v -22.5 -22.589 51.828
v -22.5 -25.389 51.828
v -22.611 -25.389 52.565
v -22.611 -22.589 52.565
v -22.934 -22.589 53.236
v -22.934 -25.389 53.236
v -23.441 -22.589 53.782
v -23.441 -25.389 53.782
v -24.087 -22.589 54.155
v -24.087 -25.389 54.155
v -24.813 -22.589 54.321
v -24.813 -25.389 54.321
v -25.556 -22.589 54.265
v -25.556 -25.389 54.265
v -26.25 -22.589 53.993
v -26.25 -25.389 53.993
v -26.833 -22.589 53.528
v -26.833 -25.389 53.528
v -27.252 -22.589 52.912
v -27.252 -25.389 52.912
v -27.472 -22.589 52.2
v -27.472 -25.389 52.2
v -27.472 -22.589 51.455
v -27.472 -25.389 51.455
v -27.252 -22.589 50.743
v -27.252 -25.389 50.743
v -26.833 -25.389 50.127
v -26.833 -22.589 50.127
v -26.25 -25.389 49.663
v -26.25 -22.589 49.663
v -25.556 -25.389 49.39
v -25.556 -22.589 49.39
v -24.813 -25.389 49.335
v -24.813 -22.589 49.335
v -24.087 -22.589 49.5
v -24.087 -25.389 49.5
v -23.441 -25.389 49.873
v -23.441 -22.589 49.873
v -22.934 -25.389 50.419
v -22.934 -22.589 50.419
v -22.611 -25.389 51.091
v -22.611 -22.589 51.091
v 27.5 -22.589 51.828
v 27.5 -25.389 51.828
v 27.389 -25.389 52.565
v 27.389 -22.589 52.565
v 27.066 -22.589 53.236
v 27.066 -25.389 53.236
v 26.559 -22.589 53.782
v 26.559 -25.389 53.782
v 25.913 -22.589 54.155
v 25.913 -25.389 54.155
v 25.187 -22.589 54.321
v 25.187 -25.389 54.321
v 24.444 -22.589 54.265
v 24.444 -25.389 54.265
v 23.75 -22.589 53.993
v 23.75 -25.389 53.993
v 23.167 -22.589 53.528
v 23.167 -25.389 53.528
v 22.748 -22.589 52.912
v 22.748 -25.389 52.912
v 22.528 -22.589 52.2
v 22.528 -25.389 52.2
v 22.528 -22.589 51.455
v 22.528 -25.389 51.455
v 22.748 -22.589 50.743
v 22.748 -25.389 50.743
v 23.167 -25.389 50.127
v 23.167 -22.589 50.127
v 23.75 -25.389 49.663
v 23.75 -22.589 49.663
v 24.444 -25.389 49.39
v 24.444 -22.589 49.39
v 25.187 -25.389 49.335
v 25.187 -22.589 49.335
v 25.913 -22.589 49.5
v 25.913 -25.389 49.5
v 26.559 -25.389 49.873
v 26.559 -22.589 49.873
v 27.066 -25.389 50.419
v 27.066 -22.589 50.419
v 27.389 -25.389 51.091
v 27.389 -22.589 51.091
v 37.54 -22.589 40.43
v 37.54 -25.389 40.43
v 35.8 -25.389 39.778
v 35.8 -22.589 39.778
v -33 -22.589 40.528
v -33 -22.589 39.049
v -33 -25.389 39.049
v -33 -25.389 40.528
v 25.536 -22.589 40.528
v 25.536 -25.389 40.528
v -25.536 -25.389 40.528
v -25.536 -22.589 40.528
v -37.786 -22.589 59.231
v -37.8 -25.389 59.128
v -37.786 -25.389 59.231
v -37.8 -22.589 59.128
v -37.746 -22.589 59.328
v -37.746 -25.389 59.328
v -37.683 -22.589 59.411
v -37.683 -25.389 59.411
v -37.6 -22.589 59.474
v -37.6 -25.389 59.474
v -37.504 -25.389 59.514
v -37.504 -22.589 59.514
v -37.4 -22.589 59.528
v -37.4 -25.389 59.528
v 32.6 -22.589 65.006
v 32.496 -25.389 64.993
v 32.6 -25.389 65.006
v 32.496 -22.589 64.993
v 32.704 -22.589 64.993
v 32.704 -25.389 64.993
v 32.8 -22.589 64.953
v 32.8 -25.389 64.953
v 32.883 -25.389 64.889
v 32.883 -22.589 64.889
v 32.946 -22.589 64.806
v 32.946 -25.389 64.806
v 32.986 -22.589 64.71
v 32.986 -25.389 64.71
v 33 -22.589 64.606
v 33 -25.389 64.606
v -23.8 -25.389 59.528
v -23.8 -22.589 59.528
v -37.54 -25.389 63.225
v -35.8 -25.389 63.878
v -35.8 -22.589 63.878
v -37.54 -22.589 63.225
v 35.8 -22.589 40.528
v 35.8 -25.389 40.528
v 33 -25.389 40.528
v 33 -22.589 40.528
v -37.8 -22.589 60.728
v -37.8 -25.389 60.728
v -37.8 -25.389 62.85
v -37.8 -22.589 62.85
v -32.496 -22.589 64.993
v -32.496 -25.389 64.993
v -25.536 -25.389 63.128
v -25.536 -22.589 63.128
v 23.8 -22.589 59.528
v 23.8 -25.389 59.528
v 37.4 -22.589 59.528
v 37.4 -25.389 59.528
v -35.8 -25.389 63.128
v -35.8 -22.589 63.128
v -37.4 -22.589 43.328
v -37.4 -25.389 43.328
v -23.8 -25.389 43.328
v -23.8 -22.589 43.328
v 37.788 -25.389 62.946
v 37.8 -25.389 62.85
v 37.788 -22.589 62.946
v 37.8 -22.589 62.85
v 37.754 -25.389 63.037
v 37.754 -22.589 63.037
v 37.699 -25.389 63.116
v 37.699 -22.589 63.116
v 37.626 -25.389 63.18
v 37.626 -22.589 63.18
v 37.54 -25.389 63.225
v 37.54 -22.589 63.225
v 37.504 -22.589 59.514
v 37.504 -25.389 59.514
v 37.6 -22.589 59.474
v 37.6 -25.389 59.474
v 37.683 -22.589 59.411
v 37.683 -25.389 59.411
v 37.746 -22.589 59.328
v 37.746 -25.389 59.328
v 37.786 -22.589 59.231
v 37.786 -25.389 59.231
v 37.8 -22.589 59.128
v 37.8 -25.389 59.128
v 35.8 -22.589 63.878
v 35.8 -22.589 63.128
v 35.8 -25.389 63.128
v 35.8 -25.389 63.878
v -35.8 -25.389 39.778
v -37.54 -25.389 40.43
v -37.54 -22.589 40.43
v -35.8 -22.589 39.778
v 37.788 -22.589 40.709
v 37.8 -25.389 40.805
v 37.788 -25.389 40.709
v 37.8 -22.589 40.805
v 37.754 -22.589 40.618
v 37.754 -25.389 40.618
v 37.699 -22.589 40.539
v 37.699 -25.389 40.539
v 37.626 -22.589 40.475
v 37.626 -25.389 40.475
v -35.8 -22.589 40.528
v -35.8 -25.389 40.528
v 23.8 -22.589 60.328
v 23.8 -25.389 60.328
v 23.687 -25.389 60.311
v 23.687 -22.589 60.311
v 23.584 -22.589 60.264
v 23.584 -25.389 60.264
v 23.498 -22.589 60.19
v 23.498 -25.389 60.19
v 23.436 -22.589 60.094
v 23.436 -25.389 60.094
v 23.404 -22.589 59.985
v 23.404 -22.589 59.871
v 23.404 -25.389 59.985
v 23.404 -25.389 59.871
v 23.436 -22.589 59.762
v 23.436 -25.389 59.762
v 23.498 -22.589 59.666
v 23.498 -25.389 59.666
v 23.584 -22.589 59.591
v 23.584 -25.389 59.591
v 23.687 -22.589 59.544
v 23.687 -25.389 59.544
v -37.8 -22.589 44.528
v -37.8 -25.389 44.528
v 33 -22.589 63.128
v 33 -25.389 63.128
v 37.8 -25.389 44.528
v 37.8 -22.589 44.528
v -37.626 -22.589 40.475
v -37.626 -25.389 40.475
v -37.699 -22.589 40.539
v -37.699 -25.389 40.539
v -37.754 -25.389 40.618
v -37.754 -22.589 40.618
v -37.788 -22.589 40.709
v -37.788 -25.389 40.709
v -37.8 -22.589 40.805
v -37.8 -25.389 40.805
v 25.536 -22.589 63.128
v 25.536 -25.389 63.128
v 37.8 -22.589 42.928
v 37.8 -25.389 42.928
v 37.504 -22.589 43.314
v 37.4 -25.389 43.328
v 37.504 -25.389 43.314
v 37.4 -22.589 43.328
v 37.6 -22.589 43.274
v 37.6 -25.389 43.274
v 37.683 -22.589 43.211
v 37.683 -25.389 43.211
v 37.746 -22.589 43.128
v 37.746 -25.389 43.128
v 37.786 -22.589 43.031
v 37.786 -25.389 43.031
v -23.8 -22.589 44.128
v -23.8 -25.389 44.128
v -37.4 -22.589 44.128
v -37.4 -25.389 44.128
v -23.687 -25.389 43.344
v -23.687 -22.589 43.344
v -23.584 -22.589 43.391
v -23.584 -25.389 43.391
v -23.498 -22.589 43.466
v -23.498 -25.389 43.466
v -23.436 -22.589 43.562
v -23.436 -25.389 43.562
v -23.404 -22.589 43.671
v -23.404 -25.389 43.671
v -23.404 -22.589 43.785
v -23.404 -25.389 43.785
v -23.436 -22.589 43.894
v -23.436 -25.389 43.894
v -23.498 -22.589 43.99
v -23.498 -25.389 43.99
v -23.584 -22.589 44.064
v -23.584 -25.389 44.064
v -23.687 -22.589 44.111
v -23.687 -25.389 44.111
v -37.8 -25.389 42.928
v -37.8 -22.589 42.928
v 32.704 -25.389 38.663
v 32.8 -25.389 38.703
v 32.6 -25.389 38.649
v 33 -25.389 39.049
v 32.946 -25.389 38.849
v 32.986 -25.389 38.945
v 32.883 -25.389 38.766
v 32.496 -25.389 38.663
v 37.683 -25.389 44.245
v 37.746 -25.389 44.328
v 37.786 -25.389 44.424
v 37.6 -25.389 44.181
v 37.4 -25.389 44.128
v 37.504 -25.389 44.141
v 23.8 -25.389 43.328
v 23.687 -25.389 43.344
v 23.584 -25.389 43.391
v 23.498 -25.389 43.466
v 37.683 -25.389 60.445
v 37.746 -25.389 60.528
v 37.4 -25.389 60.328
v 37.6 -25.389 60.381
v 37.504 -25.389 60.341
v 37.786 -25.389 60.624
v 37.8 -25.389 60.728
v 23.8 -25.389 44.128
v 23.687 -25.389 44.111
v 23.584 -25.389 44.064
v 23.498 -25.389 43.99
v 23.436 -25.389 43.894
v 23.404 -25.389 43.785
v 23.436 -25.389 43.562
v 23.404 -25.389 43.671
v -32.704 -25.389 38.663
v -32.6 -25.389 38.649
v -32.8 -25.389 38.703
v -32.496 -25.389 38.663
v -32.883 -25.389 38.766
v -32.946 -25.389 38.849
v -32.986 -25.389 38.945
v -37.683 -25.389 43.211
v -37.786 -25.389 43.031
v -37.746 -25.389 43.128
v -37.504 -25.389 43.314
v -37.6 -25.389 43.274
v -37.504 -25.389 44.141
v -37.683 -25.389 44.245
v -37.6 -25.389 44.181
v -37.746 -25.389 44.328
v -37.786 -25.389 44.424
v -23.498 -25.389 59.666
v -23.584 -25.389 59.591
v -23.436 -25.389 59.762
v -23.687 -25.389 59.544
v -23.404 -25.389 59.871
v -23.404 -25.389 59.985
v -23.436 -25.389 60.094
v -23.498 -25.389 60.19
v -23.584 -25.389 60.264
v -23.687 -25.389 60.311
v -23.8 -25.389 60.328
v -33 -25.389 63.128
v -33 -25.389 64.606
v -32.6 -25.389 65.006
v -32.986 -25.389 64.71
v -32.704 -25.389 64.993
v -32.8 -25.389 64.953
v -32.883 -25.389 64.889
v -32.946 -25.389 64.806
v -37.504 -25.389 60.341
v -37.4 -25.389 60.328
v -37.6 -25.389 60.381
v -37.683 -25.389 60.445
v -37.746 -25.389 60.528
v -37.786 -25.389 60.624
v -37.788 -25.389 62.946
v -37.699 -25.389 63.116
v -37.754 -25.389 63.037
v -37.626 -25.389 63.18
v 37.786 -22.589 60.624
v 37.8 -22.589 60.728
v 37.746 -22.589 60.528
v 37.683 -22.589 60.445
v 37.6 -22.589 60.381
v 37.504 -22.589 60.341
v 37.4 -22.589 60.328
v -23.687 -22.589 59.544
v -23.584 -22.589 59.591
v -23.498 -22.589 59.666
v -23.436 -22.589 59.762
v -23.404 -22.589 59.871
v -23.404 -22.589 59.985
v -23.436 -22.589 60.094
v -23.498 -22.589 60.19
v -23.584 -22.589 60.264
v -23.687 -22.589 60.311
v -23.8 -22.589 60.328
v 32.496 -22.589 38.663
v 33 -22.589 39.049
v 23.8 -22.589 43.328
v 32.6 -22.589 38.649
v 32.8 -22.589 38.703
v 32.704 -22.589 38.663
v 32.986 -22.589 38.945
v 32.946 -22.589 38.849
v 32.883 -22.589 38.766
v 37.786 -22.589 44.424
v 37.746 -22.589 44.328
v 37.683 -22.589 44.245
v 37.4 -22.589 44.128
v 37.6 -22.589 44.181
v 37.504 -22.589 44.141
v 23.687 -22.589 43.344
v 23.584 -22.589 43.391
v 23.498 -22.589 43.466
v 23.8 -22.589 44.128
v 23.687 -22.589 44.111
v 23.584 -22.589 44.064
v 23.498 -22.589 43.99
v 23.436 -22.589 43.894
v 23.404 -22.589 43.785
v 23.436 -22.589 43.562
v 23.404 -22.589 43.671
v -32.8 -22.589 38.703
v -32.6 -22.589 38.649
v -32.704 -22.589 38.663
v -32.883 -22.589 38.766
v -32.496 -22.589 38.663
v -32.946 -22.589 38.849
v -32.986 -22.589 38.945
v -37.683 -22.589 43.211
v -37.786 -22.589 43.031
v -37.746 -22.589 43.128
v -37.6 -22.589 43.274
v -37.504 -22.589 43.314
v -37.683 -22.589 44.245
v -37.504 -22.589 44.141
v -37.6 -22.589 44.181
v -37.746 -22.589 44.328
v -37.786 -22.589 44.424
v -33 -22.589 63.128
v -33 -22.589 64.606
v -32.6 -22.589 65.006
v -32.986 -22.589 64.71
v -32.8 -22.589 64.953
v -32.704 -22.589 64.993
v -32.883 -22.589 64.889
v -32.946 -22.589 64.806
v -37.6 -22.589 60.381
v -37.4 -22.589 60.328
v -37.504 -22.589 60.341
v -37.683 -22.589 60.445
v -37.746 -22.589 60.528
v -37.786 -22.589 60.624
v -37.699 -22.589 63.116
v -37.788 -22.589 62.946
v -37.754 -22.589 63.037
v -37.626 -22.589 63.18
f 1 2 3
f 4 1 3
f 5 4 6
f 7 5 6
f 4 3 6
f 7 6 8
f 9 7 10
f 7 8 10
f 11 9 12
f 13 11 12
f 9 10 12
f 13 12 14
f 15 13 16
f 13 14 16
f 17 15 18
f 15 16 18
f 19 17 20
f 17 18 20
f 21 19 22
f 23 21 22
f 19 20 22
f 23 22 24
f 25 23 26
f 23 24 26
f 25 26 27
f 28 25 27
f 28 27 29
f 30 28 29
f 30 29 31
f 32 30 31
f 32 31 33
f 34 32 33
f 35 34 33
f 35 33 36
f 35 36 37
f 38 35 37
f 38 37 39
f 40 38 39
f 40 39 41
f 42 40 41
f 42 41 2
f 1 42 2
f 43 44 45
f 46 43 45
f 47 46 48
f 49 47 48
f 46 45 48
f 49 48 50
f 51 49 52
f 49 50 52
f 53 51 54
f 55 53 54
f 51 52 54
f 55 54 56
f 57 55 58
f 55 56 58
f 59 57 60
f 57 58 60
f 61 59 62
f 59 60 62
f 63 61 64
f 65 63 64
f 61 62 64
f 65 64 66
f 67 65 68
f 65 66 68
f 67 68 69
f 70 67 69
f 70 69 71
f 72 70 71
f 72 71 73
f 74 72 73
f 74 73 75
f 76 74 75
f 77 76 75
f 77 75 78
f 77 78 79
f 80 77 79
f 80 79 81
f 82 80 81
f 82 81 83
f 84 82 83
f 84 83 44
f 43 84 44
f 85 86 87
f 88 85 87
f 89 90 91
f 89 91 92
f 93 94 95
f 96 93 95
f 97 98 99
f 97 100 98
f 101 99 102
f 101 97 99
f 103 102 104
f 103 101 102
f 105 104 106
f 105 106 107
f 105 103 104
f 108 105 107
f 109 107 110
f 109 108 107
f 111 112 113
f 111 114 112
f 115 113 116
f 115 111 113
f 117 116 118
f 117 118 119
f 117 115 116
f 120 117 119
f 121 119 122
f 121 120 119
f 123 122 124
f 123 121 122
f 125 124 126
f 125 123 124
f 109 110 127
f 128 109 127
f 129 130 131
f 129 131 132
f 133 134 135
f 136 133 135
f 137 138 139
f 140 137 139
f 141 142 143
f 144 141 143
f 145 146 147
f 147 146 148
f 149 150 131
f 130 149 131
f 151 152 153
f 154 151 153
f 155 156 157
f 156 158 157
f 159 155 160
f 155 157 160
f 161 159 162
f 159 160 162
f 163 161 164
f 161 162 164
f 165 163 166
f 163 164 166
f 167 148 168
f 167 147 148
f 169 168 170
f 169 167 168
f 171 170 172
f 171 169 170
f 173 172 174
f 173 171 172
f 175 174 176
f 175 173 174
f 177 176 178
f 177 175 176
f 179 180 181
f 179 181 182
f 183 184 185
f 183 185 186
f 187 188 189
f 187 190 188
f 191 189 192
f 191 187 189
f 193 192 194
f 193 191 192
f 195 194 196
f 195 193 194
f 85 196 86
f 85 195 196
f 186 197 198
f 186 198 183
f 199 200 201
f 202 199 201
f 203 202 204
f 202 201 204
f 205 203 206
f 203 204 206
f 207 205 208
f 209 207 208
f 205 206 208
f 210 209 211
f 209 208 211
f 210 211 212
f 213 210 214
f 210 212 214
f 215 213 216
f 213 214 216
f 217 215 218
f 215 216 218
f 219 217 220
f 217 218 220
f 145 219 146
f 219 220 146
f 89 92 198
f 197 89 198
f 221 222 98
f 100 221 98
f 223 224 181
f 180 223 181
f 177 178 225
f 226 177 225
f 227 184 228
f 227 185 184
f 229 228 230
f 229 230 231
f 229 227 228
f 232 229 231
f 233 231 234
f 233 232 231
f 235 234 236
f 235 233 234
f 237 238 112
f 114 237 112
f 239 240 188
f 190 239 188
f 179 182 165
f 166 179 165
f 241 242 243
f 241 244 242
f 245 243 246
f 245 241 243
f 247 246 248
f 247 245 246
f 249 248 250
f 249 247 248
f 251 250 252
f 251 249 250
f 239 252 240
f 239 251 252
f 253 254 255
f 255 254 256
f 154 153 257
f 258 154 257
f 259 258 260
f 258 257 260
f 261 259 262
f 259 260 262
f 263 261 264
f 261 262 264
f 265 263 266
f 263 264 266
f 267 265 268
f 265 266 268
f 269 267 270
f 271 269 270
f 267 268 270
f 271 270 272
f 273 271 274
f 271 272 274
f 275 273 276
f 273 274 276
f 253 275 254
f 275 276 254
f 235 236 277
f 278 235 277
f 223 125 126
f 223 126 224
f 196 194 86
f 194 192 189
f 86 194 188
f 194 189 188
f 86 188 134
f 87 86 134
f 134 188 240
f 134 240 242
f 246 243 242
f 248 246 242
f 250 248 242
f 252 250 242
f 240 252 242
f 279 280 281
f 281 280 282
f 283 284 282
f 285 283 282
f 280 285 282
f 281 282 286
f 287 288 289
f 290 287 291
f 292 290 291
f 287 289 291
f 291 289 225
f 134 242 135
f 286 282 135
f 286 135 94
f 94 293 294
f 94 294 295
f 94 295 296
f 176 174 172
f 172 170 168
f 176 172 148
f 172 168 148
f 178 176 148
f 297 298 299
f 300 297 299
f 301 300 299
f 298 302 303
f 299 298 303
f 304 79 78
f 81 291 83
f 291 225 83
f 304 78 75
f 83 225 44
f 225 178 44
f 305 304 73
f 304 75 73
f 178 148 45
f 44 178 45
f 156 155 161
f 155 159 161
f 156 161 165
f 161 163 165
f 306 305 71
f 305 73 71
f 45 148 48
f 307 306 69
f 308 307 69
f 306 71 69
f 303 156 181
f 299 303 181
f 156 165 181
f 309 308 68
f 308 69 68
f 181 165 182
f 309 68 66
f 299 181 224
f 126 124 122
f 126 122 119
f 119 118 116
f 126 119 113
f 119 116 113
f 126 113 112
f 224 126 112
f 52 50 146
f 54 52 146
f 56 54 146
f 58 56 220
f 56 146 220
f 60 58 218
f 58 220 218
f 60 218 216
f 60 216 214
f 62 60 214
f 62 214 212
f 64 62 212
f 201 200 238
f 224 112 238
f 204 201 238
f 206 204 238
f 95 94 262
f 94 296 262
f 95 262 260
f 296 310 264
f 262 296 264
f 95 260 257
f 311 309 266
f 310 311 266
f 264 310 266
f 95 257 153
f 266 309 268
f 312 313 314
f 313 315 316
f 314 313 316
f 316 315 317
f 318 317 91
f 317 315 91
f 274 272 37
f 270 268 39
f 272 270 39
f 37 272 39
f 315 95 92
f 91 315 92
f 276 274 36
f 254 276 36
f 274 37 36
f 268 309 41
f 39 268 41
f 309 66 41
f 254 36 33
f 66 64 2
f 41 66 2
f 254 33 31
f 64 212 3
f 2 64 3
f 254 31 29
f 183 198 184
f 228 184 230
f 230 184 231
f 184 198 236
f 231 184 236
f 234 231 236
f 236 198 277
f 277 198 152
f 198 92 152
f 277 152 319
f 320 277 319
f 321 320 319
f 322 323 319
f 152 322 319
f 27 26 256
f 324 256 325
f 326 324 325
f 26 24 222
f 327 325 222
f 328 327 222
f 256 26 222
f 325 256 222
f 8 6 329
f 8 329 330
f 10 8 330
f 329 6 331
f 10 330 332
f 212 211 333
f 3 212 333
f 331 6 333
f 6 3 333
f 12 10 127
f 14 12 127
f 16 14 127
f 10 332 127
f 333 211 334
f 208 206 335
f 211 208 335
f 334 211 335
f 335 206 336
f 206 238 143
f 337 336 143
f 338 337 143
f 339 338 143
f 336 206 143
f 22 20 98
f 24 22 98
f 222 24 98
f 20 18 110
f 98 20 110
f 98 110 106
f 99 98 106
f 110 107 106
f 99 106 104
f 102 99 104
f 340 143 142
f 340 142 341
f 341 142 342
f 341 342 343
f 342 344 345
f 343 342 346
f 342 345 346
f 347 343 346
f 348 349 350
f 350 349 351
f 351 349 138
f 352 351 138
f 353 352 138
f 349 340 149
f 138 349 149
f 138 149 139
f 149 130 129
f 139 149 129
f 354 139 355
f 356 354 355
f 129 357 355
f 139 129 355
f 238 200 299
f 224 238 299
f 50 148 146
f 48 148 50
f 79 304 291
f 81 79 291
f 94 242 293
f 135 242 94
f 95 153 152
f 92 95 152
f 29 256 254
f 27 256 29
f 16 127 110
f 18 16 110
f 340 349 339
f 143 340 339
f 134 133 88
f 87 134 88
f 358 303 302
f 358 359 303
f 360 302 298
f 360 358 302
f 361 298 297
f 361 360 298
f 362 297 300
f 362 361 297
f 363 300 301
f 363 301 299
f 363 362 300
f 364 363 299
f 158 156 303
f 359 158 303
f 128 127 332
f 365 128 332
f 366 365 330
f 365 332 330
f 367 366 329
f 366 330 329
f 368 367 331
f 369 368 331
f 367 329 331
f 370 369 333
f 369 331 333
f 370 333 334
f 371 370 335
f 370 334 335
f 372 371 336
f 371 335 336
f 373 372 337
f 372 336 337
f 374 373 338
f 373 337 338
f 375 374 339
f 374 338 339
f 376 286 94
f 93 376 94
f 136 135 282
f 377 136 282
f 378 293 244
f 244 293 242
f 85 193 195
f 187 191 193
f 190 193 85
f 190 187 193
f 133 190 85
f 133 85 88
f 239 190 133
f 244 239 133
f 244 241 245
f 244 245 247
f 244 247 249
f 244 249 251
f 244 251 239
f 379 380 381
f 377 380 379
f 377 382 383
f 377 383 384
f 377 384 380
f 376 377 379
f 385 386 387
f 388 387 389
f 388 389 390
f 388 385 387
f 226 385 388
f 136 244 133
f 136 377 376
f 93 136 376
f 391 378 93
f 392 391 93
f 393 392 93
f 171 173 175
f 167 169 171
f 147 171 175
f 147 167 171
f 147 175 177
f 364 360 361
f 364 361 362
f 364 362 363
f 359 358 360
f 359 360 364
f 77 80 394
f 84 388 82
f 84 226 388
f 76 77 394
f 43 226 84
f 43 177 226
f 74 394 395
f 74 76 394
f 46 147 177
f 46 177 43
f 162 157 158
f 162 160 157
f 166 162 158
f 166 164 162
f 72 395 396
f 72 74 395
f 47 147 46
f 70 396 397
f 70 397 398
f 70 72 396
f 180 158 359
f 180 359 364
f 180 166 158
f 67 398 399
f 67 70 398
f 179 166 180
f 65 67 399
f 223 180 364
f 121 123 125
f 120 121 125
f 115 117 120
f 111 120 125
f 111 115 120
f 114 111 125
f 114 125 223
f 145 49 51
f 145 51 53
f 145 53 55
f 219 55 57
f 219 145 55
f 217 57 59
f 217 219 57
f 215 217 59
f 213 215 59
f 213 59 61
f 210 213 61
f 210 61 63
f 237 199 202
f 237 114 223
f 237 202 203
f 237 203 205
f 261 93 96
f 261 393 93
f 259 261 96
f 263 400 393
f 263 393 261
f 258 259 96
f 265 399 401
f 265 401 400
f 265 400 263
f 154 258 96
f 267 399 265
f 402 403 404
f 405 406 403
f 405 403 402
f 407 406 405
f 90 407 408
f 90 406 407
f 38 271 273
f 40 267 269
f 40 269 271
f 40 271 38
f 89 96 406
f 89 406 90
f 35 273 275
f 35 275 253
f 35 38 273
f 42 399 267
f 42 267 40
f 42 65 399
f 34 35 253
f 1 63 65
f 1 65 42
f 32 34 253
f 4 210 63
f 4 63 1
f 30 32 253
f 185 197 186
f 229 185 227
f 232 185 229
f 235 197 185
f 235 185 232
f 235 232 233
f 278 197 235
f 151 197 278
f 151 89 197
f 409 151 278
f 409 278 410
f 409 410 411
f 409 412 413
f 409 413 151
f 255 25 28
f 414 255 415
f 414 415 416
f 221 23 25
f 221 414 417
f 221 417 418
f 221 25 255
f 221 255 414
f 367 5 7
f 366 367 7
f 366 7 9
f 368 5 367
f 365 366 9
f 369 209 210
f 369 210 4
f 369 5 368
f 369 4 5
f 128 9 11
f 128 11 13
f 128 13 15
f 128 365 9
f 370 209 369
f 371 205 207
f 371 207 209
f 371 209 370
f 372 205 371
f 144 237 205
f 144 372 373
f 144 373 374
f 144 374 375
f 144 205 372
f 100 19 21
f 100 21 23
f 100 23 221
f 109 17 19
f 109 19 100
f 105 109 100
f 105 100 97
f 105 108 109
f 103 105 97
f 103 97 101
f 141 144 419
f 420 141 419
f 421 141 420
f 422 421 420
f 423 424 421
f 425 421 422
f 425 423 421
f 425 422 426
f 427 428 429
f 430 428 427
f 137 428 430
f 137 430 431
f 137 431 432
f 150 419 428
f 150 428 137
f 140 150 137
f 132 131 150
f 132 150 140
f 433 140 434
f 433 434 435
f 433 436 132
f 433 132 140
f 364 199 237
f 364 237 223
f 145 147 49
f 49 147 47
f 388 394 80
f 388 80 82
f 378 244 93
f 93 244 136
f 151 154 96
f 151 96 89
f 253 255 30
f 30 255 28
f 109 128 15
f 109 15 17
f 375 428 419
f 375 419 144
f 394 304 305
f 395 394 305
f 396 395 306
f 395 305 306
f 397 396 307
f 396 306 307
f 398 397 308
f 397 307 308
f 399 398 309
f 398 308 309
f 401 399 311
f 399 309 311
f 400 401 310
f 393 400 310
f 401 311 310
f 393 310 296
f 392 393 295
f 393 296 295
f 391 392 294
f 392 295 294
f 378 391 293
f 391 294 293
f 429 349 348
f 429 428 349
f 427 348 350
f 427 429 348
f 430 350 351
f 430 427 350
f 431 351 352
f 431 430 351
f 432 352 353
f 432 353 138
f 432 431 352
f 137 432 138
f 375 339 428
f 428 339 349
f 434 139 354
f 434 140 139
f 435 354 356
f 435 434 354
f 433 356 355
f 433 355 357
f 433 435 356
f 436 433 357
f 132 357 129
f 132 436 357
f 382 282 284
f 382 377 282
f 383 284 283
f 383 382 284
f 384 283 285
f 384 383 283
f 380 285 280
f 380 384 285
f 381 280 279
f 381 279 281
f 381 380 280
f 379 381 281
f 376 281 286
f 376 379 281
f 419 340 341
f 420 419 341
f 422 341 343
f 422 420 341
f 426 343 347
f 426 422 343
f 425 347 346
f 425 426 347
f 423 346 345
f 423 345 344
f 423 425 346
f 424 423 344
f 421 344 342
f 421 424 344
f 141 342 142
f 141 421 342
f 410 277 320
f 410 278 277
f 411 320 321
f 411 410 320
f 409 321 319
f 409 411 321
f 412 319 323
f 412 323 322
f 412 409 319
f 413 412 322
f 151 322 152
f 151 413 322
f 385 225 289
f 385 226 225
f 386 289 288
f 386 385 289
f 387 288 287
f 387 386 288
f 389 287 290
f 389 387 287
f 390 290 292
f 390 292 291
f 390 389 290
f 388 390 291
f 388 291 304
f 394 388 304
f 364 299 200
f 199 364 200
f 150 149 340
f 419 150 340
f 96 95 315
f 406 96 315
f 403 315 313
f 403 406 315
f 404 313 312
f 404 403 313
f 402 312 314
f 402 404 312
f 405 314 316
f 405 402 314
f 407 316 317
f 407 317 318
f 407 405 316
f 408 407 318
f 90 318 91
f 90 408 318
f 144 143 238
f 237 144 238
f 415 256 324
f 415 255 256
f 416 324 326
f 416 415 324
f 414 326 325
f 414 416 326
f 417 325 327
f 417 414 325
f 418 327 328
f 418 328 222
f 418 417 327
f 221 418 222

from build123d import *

# Parameters (mm, degrees)
PAD010_DEPTH    = 2.8
FILLET003_R     = 0.4
SKETCH016_R     = 2.5
POCKET008_DEPTH = 2.801


with BuildPart() as part:
    # Sketch010 (on Face2 of ShapeBinder009) → Pad010 (new body)
    with BuildSketch(Plane.XZ.offset(25.388718)):
        with BuildLine():
            Line((37.8, 63.127675), (37.8, 60.327675))
            Line((37.8, 60.327675), (23.8, 60.327675))
            ThreePointArc((23.8, 60.327675), (23.4, 59.927675), (23.8, 59.527675))
            Line((23.8, 59.527675), (37.8, 59.527675))
            Line((37.8, 59.527675), (37.8, 44.127675))
            Line((37.8, 44.127675), (23.8, 44.127675))
            ThreePointArc((23.8, 44.127675), (23.4, 43.727675), (23.8, 43.327675))
            Line((23.8, 43.327675), (37.8, 43.327675))
            Line((37.8, 43.327675), (37.8, 40.527675))
            Line((37.8, 40.527675), (35.8, 39.777675))
            Line((35.8, 40.527675), (35.8, 39.777675))
            Line((35.8, 40.527675), (33, 40.527675))
            Line((33, 40.527675), (33, 38.527675))
            Line((33, 38.527675), (25.535898, 40.527675))
            Line((25.535898, 40.527675), (-25.535898, 40.527675))
            Line((-25.535898, 40.527675), (-33, 38.527675))
            Line((-33, 38.527675), (-33, 40.527675))
            Line((-33, 40.527675), (-35.8, 40.527675))
            Line((-35.8, 40.527675), (-35.8, 39.777675))
            Line((-37.8, 40.527675), (-35.8, 39.777675))
            Line((-37.8, 40.527675), (-37.8, 43.327675))
            Line((-37.8, 43.327675), (-23.8, 43.327675))
            ThreePointArc((-23.8, 43.327675), (-23.4, 43.727675), (-23.8, 44.127675))
            Line((-23.8, 44.127675), (-37.8, 44.127675))
            Line((-37.8, 44.127675), (-37.8, 59.527675))
            Line((-37.8, 59.527675), (-23.8, 59.527675))
            ThreePointArc((-23.8, 59.527675), (-23.4, 59.927675), (-23.8, 60.327675))
            Line((-23.8, 60.327675), (-37.8, 60.327675))
            Line((-37.8, 60.327675), (-37.8, 63.127675))
            Line((-35.8, 63.877675), (-37.8, 63.127675))
            Line((-35.8, 63.127675), (-35.8, 63.877675))
            Line((-35.8, 63.127675), (-33, 63.127675))
            Line((-33, 63.127675), (-33, 65.127675))
            Line((-33, 65.127675), (-25.535898, 63.127675))
            Line((-25.535898, 63.127675), (25.535898, 63.127675))
            Line((25.535898, 63.127675), (33, 65.127675))
            Line((33, 65.127675), (33, 63.127675))
            Line((33, 63.127675), (35.8, 63.127675))
            Line((35.8, 63.127675), (35.8, 63.877675))
            Line((35.8, 63.877675), (37.8, 63.127675))
        make_face()
    extrude(amount=-PAD010_DEPTH)

    # Fillet003
    fillet003_edges = [part.edges().sort_by_distance(p)[0] for p in [
        (33, -23.988718, 65.127675),
        (37.8, -23.988718, 63.127675),
        (37.8, -23.988718, 60.327675),
        (37.8, -23.988718, 59.527675),
        (37.8, -23.988718, 44.127675),
        (37.8, -23.988718, 43.327675),
        (37.8, -23.988718, 40.527675),
        (33, -23.988718, 38.527675),
        (-33, -23.988718, 65.127675),
        (-37.8, -23.988718, 63.127675),
        (-37.8, -23.988718, 60.327675),
        (-37.8, -23.988718, 59.527675),
        (-37.8, -23.988718, 44.127675),
        (-37.8, -23.988718, 43.327675),
        (-37.8, -23.988718, 40.527675),
        (-33, -23.988718, 38.527675),
    ]]
    fillet(fillet003_edges, radius=FILLET003_R)

    # Sketch016 (on Face2 of Fillet003) → Pocket008 (cut, through all)
    with BuildSketch(Plane.XZ.offset(25.388718)):
        with Locations((-25, 51.827675)):
            Circle(SKETCH016_R)
        with Locations((25, 51.827675)):
            Circle(SKETCH016_R)
    extrude(amount=-POCKET008_DEPTH, mode=Mode.SUBTRACT)


solid = part.part
